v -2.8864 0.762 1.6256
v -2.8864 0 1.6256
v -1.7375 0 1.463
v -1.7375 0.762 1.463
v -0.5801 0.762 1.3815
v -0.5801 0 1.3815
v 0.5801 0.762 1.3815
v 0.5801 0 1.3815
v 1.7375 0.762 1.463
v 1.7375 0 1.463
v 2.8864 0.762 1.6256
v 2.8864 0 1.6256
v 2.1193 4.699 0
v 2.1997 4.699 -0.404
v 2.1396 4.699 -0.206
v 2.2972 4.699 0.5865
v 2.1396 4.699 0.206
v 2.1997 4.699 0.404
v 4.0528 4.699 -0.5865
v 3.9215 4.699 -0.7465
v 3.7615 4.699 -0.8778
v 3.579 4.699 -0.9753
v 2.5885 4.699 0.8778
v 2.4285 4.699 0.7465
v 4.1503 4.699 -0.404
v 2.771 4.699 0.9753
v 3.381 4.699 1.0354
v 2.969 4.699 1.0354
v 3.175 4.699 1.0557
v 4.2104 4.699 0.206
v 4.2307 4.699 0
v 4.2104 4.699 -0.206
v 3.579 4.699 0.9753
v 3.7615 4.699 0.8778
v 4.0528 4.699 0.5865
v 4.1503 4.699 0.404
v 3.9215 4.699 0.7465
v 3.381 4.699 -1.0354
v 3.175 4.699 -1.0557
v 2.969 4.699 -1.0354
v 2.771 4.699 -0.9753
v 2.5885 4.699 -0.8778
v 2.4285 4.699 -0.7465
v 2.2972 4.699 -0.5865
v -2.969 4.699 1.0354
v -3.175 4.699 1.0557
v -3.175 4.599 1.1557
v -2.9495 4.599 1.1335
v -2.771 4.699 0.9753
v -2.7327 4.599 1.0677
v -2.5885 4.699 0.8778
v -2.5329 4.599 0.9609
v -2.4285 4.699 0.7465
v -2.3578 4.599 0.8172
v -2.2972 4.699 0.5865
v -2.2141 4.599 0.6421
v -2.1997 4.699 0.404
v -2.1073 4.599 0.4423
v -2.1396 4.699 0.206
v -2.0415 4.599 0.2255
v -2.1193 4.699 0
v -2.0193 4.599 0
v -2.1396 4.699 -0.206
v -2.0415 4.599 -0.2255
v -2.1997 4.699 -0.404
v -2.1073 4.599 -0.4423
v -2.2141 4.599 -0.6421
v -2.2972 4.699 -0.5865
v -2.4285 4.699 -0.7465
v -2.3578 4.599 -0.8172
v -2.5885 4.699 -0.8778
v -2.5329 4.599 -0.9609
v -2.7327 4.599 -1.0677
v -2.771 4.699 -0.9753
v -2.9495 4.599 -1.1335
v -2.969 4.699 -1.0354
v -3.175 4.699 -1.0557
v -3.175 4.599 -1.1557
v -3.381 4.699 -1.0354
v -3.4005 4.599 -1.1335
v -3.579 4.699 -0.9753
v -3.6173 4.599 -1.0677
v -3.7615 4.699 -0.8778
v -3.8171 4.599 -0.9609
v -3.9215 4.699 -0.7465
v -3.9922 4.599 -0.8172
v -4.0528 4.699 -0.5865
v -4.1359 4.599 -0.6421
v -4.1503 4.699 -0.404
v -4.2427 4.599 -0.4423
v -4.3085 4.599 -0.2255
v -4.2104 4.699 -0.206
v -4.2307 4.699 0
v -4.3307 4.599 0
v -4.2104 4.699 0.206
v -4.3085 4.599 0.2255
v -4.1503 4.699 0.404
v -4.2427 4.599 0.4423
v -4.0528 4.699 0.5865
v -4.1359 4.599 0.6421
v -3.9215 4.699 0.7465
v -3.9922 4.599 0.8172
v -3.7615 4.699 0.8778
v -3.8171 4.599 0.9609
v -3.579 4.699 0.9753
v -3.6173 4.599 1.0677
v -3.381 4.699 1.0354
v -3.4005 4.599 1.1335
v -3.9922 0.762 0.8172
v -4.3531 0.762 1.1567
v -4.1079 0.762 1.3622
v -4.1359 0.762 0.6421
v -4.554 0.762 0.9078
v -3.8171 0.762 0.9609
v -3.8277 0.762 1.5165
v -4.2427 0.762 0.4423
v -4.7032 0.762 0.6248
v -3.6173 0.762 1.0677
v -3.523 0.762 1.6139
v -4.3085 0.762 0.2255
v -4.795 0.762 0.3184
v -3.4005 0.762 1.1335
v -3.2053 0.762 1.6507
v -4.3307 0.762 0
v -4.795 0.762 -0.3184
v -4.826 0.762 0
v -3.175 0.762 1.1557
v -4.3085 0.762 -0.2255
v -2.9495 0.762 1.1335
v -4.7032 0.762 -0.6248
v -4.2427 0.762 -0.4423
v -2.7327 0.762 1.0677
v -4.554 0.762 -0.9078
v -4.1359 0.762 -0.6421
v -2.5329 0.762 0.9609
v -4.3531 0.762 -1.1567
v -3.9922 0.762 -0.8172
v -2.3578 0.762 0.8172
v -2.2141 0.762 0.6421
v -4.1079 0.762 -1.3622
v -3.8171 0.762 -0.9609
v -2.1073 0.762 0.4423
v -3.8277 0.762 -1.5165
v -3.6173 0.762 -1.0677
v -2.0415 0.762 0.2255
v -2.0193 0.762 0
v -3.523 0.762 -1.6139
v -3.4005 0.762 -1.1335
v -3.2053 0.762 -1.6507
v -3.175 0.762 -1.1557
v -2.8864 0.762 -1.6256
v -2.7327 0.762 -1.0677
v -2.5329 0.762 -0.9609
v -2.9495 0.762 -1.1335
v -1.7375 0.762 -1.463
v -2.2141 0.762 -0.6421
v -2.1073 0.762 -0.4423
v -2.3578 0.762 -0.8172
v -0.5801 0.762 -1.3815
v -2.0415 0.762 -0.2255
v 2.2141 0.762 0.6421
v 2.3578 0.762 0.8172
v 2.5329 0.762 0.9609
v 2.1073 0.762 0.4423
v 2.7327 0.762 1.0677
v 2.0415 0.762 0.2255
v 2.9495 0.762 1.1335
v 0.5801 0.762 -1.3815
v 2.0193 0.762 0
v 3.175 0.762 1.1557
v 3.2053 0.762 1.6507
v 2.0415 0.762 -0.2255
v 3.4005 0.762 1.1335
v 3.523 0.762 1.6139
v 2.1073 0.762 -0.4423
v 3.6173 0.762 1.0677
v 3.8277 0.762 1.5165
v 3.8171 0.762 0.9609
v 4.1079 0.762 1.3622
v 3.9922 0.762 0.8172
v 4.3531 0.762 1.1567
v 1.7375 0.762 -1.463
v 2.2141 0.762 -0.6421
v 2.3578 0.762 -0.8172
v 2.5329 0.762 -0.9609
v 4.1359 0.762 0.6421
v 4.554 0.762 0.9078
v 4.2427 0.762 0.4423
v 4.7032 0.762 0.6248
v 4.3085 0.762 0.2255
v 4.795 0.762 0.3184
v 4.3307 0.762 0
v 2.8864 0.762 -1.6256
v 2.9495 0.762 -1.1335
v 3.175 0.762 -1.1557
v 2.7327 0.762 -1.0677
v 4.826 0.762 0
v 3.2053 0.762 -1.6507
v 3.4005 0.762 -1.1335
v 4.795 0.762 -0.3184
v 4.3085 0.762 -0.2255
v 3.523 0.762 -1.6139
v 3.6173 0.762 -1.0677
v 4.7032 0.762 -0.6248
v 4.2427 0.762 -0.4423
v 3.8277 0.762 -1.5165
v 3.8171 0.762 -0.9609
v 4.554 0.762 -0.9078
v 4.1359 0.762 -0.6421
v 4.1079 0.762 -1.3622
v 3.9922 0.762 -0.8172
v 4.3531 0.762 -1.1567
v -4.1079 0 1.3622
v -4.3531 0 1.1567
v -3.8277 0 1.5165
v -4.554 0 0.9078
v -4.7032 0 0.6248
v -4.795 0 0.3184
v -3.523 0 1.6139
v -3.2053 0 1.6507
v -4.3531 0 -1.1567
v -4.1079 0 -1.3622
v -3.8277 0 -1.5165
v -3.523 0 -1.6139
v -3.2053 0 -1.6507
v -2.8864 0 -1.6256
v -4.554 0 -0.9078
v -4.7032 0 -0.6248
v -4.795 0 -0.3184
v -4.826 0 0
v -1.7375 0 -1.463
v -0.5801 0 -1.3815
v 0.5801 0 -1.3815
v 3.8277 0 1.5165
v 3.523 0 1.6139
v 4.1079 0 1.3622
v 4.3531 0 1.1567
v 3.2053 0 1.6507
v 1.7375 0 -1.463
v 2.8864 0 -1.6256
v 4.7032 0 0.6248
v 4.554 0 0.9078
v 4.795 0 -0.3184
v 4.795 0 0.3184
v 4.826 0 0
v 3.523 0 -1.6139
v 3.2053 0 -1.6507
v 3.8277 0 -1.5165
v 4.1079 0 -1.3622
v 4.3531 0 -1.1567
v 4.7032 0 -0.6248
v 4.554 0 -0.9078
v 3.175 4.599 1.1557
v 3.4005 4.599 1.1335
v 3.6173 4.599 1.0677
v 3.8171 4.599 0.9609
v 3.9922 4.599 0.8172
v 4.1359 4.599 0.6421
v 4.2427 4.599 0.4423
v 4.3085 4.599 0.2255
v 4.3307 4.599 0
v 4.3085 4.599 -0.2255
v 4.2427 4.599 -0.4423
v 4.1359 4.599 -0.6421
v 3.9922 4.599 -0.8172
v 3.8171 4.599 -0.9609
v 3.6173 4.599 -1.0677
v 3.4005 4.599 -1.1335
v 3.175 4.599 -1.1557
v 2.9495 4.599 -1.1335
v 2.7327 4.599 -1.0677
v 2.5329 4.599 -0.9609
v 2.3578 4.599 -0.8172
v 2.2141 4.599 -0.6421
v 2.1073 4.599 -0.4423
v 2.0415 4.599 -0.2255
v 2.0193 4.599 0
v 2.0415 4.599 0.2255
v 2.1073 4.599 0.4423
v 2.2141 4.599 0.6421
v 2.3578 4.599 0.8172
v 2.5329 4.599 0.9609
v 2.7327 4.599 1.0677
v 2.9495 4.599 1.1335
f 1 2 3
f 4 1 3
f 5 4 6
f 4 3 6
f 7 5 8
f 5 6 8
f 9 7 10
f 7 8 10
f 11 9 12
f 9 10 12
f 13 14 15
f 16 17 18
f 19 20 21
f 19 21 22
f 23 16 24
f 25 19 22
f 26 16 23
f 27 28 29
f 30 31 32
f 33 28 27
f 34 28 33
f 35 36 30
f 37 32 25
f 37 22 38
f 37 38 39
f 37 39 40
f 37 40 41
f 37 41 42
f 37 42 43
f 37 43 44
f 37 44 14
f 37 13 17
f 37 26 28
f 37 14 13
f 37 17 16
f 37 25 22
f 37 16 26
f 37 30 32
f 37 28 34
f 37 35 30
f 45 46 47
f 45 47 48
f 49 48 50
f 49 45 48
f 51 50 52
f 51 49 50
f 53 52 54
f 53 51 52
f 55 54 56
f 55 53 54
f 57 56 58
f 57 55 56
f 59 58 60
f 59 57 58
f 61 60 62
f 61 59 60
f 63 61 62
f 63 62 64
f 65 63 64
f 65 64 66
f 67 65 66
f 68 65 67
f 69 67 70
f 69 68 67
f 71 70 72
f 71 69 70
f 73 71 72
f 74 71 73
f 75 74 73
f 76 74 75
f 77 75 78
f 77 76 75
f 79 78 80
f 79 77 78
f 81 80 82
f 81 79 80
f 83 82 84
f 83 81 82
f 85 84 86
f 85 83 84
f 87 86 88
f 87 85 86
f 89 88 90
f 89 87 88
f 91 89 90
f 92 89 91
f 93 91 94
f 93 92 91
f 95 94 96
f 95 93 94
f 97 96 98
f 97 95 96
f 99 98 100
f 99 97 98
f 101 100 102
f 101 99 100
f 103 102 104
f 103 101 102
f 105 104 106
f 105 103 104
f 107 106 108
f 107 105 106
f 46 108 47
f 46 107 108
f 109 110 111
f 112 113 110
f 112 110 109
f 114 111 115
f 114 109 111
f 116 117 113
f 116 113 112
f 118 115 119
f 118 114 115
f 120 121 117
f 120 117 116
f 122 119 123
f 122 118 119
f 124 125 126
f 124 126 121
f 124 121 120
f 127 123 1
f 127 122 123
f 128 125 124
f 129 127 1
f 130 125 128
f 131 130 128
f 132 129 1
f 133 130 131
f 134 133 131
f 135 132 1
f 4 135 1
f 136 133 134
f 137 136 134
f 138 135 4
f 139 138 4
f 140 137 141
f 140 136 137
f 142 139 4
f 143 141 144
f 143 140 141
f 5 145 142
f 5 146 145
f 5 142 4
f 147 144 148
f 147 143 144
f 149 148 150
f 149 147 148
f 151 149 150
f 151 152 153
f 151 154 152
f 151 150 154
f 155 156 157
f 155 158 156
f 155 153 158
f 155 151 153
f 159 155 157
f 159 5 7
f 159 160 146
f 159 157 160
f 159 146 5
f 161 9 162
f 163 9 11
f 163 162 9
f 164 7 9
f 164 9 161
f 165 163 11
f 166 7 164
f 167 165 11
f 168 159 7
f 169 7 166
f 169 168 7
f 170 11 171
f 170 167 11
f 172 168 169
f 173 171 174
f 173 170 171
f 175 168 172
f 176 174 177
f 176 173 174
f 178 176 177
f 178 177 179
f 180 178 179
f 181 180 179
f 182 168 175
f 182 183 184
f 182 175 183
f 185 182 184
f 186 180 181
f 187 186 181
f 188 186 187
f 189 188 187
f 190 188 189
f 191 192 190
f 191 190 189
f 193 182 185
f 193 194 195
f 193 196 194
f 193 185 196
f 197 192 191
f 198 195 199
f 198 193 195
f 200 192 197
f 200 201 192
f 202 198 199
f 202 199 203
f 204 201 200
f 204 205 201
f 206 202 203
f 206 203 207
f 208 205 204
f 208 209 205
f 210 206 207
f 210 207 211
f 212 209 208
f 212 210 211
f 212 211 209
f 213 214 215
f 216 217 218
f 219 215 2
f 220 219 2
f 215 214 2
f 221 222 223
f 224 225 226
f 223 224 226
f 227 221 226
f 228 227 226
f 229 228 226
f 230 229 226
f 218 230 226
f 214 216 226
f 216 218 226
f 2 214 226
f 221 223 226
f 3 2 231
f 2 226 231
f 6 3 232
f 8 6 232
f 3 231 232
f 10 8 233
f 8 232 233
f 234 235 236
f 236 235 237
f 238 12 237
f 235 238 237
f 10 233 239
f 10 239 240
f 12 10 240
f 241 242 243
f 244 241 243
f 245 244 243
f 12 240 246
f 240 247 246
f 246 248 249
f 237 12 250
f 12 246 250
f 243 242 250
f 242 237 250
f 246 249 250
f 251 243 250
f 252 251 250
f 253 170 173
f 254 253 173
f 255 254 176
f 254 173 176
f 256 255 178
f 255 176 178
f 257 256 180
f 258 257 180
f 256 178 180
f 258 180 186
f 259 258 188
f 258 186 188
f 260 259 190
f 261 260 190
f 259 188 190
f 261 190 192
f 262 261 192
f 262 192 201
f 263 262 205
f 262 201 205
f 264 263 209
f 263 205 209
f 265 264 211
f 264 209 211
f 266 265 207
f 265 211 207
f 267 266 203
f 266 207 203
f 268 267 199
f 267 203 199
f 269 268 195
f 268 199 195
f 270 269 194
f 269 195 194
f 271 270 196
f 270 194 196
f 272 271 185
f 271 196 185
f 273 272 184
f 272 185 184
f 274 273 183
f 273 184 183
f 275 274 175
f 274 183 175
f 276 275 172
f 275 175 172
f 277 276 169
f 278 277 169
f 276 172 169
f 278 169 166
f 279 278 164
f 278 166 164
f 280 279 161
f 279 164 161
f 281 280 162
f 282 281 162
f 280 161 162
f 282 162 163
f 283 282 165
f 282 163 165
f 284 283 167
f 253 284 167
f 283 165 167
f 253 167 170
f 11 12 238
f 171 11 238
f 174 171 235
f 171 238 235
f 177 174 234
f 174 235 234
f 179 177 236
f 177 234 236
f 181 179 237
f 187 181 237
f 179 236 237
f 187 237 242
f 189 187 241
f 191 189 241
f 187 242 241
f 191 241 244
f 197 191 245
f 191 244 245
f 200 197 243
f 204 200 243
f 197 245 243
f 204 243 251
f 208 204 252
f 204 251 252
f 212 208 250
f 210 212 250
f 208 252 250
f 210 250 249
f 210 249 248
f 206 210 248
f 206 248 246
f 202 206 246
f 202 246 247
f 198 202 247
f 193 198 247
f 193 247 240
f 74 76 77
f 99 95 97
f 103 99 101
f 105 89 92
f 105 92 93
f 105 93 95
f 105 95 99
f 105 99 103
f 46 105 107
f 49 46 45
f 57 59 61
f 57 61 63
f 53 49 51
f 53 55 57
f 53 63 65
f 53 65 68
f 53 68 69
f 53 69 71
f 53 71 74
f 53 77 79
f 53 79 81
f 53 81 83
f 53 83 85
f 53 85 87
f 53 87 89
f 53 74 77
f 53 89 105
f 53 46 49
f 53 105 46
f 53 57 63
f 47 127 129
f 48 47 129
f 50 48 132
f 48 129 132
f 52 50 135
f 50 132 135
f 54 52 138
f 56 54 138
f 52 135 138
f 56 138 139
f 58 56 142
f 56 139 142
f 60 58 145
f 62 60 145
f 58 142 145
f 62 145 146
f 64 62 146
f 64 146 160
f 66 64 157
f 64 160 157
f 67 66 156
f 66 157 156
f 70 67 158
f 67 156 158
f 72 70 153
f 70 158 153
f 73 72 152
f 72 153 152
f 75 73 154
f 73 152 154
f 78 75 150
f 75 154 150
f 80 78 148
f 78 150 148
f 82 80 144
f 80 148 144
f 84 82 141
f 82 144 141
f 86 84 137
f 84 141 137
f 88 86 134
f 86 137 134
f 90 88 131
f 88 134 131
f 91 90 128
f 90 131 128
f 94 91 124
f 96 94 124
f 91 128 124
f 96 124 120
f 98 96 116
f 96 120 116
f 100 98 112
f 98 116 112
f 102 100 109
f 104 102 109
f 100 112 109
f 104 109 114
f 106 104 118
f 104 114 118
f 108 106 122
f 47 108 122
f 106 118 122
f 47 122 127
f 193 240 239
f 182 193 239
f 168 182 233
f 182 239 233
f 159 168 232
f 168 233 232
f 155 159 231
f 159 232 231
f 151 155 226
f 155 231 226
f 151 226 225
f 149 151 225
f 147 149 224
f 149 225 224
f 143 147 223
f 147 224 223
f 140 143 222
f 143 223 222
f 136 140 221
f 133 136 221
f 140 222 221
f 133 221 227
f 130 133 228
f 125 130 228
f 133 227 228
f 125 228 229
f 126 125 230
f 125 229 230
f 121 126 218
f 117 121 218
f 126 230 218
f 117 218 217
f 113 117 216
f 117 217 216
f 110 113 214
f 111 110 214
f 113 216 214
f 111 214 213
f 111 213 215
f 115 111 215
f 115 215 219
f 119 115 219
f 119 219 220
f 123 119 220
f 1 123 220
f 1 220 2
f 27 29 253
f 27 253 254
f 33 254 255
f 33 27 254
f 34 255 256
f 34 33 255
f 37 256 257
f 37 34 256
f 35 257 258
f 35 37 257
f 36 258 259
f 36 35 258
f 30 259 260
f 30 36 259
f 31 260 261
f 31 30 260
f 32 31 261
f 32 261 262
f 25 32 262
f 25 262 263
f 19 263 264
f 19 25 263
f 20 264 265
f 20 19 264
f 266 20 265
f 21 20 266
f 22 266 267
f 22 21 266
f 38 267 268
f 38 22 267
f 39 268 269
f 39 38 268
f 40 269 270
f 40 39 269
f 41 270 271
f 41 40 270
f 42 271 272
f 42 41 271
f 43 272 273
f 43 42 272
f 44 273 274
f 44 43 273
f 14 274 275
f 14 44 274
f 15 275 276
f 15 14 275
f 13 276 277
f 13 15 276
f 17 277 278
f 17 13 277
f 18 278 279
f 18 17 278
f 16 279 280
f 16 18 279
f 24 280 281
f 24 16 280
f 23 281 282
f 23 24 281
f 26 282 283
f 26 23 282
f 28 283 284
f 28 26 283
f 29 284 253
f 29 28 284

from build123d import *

# Parameters (mm, degrees)
BOSS_EXTRUDE1_DEPTH = 0.762
SKETCH3_R           = 1.1557
BOSS_EXTRUDE2_DEPTH = 3.937
CHAMFER1_SIZE       = 0.1


with BuildPart() as part:
    # Sketch2 → Boss-Extrude1 (new body)
    with BuildSketch(Plane(origin=(0, 0, 0), x_dir=(1, 0, 0), z_dir=(0, 1, 0))):
        with BuildLine():
            ThreePointArc((-2.886363636, 1.62557376), (-4.826, 0), (-2.886363636, -1.62557376))
            ThreePointArc((-2.886363636, -1.62557376), (0, -1.371311361), (2.886363636, -1.62557376))
            ThreePointArc((2.886363636, -1.62557376), (4.826, 0), (2.886363636, 1.62557376))
            ThreePointArc((2.886363636, 1.62557376), (0, 1.371311361), (-2.886363636, 1.62557376))
        make_face()
    extrude(amount=BOSS_EXTRUDE1_DEPTH)

    # Sketch3 → Boss-Extrude2 (add)
    with BuildSketch(Plane(origin=(0, 0.762, 0), x_dir=(1, 0, 0), z_dir=(0, 1, 0))):
        with Locations(Location((-3.175, 0, 0), (0, 0, 270))):
            Circle(SKETCH3_R)
        with Locations(Location((3.175, 0, 0), (0, 0, 270))):
            Circle(SKETCH3_R)
    extrude(amount=BOSS_EXTRUDE2_DEPTH)

    # Chamfer1
    chamfer1_edges = [part.edges().sort_by_distance(p)[0] for p in [
        (-3.175, 4.699, -1.1557),
        (3.175, 4.699, -1.1557),
    ]]
    chamfer(chamfer1_edges, length=CHAMFER1_SIZE)


solid = part.part
